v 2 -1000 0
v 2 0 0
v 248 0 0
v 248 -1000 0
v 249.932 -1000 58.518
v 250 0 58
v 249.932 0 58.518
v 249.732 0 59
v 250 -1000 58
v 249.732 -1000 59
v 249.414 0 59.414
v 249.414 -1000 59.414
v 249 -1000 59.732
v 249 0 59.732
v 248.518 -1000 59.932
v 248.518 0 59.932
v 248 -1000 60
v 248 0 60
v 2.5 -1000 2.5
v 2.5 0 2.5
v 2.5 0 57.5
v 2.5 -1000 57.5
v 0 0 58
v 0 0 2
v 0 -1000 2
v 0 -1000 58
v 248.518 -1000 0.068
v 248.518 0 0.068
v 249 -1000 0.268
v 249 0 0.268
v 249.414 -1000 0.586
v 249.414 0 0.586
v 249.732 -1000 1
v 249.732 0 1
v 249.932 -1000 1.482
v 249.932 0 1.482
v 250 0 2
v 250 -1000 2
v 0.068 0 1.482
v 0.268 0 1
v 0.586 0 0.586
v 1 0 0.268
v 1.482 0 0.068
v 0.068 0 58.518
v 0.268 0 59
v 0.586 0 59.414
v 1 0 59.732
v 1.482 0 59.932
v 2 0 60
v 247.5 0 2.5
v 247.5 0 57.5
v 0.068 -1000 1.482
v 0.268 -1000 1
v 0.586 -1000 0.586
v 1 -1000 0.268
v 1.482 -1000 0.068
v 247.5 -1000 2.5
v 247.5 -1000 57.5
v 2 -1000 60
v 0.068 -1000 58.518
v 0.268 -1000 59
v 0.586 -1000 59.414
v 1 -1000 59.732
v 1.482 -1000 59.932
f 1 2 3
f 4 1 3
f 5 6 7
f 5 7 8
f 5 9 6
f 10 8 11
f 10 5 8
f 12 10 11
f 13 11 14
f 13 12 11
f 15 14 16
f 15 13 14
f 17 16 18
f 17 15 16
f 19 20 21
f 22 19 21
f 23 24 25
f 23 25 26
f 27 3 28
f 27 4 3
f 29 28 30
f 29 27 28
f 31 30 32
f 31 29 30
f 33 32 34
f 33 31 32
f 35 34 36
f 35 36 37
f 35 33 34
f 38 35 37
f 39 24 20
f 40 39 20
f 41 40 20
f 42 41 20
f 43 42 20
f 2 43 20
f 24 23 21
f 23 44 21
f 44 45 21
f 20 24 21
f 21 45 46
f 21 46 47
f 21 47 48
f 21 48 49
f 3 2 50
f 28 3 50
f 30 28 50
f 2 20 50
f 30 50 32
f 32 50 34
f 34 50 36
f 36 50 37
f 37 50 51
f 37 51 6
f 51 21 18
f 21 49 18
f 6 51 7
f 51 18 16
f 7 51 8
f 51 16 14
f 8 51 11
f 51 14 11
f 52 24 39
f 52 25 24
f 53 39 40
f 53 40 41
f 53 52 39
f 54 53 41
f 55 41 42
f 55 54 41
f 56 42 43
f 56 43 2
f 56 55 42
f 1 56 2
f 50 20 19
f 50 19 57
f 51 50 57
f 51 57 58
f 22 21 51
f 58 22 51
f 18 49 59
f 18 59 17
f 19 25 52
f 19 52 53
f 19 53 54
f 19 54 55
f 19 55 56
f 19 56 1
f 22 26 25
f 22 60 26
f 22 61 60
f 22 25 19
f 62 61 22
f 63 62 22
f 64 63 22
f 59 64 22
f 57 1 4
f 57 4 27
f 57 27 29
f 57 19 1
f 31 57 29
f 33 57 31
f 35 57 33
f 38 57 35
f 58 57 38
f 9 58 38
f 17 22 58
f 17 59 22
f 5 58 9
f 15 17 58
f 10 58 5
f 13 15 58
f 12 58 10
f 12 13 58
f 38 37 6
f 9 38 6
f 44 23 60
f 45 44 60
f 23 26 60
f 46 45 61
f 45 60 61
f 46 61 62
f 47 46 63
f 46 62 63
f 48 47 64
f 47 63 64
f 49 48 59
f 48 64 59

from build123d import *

# Parameters (mm, degrees)
F0_W     = 250
F0_H     = 60
F1_DEPTH = 1000
F2_T     = -2.5
F3_R     = 2


with BuildPart() as f1:
    # F0 (on Front) → F1 (new body)
    with BuildSketch(Plane.XZ):
        with Locations((125, 30)):
            Rectangle(F0_W, F0_H)
    extrude(amount=F1_DEPTH)

    # F2
    f2_openings = [f1.faces().sort_by_distance(p)[0] for p in [
        (125, -1000, 30),
        (125, 0, 30),
    ]]
    offset(amount=F2_T, openings=f2_openings)

    # F3
    f3_edges = [f1.edges().sort_by_distance(p)[0] for p in [
        (0, -500, 60),
        (250, -500, 60),
        (250, -500, 0),
        (0, -500, 0),
    ]]
    fillet(f3_edges, radius=F3_R)


solid = f1.part
